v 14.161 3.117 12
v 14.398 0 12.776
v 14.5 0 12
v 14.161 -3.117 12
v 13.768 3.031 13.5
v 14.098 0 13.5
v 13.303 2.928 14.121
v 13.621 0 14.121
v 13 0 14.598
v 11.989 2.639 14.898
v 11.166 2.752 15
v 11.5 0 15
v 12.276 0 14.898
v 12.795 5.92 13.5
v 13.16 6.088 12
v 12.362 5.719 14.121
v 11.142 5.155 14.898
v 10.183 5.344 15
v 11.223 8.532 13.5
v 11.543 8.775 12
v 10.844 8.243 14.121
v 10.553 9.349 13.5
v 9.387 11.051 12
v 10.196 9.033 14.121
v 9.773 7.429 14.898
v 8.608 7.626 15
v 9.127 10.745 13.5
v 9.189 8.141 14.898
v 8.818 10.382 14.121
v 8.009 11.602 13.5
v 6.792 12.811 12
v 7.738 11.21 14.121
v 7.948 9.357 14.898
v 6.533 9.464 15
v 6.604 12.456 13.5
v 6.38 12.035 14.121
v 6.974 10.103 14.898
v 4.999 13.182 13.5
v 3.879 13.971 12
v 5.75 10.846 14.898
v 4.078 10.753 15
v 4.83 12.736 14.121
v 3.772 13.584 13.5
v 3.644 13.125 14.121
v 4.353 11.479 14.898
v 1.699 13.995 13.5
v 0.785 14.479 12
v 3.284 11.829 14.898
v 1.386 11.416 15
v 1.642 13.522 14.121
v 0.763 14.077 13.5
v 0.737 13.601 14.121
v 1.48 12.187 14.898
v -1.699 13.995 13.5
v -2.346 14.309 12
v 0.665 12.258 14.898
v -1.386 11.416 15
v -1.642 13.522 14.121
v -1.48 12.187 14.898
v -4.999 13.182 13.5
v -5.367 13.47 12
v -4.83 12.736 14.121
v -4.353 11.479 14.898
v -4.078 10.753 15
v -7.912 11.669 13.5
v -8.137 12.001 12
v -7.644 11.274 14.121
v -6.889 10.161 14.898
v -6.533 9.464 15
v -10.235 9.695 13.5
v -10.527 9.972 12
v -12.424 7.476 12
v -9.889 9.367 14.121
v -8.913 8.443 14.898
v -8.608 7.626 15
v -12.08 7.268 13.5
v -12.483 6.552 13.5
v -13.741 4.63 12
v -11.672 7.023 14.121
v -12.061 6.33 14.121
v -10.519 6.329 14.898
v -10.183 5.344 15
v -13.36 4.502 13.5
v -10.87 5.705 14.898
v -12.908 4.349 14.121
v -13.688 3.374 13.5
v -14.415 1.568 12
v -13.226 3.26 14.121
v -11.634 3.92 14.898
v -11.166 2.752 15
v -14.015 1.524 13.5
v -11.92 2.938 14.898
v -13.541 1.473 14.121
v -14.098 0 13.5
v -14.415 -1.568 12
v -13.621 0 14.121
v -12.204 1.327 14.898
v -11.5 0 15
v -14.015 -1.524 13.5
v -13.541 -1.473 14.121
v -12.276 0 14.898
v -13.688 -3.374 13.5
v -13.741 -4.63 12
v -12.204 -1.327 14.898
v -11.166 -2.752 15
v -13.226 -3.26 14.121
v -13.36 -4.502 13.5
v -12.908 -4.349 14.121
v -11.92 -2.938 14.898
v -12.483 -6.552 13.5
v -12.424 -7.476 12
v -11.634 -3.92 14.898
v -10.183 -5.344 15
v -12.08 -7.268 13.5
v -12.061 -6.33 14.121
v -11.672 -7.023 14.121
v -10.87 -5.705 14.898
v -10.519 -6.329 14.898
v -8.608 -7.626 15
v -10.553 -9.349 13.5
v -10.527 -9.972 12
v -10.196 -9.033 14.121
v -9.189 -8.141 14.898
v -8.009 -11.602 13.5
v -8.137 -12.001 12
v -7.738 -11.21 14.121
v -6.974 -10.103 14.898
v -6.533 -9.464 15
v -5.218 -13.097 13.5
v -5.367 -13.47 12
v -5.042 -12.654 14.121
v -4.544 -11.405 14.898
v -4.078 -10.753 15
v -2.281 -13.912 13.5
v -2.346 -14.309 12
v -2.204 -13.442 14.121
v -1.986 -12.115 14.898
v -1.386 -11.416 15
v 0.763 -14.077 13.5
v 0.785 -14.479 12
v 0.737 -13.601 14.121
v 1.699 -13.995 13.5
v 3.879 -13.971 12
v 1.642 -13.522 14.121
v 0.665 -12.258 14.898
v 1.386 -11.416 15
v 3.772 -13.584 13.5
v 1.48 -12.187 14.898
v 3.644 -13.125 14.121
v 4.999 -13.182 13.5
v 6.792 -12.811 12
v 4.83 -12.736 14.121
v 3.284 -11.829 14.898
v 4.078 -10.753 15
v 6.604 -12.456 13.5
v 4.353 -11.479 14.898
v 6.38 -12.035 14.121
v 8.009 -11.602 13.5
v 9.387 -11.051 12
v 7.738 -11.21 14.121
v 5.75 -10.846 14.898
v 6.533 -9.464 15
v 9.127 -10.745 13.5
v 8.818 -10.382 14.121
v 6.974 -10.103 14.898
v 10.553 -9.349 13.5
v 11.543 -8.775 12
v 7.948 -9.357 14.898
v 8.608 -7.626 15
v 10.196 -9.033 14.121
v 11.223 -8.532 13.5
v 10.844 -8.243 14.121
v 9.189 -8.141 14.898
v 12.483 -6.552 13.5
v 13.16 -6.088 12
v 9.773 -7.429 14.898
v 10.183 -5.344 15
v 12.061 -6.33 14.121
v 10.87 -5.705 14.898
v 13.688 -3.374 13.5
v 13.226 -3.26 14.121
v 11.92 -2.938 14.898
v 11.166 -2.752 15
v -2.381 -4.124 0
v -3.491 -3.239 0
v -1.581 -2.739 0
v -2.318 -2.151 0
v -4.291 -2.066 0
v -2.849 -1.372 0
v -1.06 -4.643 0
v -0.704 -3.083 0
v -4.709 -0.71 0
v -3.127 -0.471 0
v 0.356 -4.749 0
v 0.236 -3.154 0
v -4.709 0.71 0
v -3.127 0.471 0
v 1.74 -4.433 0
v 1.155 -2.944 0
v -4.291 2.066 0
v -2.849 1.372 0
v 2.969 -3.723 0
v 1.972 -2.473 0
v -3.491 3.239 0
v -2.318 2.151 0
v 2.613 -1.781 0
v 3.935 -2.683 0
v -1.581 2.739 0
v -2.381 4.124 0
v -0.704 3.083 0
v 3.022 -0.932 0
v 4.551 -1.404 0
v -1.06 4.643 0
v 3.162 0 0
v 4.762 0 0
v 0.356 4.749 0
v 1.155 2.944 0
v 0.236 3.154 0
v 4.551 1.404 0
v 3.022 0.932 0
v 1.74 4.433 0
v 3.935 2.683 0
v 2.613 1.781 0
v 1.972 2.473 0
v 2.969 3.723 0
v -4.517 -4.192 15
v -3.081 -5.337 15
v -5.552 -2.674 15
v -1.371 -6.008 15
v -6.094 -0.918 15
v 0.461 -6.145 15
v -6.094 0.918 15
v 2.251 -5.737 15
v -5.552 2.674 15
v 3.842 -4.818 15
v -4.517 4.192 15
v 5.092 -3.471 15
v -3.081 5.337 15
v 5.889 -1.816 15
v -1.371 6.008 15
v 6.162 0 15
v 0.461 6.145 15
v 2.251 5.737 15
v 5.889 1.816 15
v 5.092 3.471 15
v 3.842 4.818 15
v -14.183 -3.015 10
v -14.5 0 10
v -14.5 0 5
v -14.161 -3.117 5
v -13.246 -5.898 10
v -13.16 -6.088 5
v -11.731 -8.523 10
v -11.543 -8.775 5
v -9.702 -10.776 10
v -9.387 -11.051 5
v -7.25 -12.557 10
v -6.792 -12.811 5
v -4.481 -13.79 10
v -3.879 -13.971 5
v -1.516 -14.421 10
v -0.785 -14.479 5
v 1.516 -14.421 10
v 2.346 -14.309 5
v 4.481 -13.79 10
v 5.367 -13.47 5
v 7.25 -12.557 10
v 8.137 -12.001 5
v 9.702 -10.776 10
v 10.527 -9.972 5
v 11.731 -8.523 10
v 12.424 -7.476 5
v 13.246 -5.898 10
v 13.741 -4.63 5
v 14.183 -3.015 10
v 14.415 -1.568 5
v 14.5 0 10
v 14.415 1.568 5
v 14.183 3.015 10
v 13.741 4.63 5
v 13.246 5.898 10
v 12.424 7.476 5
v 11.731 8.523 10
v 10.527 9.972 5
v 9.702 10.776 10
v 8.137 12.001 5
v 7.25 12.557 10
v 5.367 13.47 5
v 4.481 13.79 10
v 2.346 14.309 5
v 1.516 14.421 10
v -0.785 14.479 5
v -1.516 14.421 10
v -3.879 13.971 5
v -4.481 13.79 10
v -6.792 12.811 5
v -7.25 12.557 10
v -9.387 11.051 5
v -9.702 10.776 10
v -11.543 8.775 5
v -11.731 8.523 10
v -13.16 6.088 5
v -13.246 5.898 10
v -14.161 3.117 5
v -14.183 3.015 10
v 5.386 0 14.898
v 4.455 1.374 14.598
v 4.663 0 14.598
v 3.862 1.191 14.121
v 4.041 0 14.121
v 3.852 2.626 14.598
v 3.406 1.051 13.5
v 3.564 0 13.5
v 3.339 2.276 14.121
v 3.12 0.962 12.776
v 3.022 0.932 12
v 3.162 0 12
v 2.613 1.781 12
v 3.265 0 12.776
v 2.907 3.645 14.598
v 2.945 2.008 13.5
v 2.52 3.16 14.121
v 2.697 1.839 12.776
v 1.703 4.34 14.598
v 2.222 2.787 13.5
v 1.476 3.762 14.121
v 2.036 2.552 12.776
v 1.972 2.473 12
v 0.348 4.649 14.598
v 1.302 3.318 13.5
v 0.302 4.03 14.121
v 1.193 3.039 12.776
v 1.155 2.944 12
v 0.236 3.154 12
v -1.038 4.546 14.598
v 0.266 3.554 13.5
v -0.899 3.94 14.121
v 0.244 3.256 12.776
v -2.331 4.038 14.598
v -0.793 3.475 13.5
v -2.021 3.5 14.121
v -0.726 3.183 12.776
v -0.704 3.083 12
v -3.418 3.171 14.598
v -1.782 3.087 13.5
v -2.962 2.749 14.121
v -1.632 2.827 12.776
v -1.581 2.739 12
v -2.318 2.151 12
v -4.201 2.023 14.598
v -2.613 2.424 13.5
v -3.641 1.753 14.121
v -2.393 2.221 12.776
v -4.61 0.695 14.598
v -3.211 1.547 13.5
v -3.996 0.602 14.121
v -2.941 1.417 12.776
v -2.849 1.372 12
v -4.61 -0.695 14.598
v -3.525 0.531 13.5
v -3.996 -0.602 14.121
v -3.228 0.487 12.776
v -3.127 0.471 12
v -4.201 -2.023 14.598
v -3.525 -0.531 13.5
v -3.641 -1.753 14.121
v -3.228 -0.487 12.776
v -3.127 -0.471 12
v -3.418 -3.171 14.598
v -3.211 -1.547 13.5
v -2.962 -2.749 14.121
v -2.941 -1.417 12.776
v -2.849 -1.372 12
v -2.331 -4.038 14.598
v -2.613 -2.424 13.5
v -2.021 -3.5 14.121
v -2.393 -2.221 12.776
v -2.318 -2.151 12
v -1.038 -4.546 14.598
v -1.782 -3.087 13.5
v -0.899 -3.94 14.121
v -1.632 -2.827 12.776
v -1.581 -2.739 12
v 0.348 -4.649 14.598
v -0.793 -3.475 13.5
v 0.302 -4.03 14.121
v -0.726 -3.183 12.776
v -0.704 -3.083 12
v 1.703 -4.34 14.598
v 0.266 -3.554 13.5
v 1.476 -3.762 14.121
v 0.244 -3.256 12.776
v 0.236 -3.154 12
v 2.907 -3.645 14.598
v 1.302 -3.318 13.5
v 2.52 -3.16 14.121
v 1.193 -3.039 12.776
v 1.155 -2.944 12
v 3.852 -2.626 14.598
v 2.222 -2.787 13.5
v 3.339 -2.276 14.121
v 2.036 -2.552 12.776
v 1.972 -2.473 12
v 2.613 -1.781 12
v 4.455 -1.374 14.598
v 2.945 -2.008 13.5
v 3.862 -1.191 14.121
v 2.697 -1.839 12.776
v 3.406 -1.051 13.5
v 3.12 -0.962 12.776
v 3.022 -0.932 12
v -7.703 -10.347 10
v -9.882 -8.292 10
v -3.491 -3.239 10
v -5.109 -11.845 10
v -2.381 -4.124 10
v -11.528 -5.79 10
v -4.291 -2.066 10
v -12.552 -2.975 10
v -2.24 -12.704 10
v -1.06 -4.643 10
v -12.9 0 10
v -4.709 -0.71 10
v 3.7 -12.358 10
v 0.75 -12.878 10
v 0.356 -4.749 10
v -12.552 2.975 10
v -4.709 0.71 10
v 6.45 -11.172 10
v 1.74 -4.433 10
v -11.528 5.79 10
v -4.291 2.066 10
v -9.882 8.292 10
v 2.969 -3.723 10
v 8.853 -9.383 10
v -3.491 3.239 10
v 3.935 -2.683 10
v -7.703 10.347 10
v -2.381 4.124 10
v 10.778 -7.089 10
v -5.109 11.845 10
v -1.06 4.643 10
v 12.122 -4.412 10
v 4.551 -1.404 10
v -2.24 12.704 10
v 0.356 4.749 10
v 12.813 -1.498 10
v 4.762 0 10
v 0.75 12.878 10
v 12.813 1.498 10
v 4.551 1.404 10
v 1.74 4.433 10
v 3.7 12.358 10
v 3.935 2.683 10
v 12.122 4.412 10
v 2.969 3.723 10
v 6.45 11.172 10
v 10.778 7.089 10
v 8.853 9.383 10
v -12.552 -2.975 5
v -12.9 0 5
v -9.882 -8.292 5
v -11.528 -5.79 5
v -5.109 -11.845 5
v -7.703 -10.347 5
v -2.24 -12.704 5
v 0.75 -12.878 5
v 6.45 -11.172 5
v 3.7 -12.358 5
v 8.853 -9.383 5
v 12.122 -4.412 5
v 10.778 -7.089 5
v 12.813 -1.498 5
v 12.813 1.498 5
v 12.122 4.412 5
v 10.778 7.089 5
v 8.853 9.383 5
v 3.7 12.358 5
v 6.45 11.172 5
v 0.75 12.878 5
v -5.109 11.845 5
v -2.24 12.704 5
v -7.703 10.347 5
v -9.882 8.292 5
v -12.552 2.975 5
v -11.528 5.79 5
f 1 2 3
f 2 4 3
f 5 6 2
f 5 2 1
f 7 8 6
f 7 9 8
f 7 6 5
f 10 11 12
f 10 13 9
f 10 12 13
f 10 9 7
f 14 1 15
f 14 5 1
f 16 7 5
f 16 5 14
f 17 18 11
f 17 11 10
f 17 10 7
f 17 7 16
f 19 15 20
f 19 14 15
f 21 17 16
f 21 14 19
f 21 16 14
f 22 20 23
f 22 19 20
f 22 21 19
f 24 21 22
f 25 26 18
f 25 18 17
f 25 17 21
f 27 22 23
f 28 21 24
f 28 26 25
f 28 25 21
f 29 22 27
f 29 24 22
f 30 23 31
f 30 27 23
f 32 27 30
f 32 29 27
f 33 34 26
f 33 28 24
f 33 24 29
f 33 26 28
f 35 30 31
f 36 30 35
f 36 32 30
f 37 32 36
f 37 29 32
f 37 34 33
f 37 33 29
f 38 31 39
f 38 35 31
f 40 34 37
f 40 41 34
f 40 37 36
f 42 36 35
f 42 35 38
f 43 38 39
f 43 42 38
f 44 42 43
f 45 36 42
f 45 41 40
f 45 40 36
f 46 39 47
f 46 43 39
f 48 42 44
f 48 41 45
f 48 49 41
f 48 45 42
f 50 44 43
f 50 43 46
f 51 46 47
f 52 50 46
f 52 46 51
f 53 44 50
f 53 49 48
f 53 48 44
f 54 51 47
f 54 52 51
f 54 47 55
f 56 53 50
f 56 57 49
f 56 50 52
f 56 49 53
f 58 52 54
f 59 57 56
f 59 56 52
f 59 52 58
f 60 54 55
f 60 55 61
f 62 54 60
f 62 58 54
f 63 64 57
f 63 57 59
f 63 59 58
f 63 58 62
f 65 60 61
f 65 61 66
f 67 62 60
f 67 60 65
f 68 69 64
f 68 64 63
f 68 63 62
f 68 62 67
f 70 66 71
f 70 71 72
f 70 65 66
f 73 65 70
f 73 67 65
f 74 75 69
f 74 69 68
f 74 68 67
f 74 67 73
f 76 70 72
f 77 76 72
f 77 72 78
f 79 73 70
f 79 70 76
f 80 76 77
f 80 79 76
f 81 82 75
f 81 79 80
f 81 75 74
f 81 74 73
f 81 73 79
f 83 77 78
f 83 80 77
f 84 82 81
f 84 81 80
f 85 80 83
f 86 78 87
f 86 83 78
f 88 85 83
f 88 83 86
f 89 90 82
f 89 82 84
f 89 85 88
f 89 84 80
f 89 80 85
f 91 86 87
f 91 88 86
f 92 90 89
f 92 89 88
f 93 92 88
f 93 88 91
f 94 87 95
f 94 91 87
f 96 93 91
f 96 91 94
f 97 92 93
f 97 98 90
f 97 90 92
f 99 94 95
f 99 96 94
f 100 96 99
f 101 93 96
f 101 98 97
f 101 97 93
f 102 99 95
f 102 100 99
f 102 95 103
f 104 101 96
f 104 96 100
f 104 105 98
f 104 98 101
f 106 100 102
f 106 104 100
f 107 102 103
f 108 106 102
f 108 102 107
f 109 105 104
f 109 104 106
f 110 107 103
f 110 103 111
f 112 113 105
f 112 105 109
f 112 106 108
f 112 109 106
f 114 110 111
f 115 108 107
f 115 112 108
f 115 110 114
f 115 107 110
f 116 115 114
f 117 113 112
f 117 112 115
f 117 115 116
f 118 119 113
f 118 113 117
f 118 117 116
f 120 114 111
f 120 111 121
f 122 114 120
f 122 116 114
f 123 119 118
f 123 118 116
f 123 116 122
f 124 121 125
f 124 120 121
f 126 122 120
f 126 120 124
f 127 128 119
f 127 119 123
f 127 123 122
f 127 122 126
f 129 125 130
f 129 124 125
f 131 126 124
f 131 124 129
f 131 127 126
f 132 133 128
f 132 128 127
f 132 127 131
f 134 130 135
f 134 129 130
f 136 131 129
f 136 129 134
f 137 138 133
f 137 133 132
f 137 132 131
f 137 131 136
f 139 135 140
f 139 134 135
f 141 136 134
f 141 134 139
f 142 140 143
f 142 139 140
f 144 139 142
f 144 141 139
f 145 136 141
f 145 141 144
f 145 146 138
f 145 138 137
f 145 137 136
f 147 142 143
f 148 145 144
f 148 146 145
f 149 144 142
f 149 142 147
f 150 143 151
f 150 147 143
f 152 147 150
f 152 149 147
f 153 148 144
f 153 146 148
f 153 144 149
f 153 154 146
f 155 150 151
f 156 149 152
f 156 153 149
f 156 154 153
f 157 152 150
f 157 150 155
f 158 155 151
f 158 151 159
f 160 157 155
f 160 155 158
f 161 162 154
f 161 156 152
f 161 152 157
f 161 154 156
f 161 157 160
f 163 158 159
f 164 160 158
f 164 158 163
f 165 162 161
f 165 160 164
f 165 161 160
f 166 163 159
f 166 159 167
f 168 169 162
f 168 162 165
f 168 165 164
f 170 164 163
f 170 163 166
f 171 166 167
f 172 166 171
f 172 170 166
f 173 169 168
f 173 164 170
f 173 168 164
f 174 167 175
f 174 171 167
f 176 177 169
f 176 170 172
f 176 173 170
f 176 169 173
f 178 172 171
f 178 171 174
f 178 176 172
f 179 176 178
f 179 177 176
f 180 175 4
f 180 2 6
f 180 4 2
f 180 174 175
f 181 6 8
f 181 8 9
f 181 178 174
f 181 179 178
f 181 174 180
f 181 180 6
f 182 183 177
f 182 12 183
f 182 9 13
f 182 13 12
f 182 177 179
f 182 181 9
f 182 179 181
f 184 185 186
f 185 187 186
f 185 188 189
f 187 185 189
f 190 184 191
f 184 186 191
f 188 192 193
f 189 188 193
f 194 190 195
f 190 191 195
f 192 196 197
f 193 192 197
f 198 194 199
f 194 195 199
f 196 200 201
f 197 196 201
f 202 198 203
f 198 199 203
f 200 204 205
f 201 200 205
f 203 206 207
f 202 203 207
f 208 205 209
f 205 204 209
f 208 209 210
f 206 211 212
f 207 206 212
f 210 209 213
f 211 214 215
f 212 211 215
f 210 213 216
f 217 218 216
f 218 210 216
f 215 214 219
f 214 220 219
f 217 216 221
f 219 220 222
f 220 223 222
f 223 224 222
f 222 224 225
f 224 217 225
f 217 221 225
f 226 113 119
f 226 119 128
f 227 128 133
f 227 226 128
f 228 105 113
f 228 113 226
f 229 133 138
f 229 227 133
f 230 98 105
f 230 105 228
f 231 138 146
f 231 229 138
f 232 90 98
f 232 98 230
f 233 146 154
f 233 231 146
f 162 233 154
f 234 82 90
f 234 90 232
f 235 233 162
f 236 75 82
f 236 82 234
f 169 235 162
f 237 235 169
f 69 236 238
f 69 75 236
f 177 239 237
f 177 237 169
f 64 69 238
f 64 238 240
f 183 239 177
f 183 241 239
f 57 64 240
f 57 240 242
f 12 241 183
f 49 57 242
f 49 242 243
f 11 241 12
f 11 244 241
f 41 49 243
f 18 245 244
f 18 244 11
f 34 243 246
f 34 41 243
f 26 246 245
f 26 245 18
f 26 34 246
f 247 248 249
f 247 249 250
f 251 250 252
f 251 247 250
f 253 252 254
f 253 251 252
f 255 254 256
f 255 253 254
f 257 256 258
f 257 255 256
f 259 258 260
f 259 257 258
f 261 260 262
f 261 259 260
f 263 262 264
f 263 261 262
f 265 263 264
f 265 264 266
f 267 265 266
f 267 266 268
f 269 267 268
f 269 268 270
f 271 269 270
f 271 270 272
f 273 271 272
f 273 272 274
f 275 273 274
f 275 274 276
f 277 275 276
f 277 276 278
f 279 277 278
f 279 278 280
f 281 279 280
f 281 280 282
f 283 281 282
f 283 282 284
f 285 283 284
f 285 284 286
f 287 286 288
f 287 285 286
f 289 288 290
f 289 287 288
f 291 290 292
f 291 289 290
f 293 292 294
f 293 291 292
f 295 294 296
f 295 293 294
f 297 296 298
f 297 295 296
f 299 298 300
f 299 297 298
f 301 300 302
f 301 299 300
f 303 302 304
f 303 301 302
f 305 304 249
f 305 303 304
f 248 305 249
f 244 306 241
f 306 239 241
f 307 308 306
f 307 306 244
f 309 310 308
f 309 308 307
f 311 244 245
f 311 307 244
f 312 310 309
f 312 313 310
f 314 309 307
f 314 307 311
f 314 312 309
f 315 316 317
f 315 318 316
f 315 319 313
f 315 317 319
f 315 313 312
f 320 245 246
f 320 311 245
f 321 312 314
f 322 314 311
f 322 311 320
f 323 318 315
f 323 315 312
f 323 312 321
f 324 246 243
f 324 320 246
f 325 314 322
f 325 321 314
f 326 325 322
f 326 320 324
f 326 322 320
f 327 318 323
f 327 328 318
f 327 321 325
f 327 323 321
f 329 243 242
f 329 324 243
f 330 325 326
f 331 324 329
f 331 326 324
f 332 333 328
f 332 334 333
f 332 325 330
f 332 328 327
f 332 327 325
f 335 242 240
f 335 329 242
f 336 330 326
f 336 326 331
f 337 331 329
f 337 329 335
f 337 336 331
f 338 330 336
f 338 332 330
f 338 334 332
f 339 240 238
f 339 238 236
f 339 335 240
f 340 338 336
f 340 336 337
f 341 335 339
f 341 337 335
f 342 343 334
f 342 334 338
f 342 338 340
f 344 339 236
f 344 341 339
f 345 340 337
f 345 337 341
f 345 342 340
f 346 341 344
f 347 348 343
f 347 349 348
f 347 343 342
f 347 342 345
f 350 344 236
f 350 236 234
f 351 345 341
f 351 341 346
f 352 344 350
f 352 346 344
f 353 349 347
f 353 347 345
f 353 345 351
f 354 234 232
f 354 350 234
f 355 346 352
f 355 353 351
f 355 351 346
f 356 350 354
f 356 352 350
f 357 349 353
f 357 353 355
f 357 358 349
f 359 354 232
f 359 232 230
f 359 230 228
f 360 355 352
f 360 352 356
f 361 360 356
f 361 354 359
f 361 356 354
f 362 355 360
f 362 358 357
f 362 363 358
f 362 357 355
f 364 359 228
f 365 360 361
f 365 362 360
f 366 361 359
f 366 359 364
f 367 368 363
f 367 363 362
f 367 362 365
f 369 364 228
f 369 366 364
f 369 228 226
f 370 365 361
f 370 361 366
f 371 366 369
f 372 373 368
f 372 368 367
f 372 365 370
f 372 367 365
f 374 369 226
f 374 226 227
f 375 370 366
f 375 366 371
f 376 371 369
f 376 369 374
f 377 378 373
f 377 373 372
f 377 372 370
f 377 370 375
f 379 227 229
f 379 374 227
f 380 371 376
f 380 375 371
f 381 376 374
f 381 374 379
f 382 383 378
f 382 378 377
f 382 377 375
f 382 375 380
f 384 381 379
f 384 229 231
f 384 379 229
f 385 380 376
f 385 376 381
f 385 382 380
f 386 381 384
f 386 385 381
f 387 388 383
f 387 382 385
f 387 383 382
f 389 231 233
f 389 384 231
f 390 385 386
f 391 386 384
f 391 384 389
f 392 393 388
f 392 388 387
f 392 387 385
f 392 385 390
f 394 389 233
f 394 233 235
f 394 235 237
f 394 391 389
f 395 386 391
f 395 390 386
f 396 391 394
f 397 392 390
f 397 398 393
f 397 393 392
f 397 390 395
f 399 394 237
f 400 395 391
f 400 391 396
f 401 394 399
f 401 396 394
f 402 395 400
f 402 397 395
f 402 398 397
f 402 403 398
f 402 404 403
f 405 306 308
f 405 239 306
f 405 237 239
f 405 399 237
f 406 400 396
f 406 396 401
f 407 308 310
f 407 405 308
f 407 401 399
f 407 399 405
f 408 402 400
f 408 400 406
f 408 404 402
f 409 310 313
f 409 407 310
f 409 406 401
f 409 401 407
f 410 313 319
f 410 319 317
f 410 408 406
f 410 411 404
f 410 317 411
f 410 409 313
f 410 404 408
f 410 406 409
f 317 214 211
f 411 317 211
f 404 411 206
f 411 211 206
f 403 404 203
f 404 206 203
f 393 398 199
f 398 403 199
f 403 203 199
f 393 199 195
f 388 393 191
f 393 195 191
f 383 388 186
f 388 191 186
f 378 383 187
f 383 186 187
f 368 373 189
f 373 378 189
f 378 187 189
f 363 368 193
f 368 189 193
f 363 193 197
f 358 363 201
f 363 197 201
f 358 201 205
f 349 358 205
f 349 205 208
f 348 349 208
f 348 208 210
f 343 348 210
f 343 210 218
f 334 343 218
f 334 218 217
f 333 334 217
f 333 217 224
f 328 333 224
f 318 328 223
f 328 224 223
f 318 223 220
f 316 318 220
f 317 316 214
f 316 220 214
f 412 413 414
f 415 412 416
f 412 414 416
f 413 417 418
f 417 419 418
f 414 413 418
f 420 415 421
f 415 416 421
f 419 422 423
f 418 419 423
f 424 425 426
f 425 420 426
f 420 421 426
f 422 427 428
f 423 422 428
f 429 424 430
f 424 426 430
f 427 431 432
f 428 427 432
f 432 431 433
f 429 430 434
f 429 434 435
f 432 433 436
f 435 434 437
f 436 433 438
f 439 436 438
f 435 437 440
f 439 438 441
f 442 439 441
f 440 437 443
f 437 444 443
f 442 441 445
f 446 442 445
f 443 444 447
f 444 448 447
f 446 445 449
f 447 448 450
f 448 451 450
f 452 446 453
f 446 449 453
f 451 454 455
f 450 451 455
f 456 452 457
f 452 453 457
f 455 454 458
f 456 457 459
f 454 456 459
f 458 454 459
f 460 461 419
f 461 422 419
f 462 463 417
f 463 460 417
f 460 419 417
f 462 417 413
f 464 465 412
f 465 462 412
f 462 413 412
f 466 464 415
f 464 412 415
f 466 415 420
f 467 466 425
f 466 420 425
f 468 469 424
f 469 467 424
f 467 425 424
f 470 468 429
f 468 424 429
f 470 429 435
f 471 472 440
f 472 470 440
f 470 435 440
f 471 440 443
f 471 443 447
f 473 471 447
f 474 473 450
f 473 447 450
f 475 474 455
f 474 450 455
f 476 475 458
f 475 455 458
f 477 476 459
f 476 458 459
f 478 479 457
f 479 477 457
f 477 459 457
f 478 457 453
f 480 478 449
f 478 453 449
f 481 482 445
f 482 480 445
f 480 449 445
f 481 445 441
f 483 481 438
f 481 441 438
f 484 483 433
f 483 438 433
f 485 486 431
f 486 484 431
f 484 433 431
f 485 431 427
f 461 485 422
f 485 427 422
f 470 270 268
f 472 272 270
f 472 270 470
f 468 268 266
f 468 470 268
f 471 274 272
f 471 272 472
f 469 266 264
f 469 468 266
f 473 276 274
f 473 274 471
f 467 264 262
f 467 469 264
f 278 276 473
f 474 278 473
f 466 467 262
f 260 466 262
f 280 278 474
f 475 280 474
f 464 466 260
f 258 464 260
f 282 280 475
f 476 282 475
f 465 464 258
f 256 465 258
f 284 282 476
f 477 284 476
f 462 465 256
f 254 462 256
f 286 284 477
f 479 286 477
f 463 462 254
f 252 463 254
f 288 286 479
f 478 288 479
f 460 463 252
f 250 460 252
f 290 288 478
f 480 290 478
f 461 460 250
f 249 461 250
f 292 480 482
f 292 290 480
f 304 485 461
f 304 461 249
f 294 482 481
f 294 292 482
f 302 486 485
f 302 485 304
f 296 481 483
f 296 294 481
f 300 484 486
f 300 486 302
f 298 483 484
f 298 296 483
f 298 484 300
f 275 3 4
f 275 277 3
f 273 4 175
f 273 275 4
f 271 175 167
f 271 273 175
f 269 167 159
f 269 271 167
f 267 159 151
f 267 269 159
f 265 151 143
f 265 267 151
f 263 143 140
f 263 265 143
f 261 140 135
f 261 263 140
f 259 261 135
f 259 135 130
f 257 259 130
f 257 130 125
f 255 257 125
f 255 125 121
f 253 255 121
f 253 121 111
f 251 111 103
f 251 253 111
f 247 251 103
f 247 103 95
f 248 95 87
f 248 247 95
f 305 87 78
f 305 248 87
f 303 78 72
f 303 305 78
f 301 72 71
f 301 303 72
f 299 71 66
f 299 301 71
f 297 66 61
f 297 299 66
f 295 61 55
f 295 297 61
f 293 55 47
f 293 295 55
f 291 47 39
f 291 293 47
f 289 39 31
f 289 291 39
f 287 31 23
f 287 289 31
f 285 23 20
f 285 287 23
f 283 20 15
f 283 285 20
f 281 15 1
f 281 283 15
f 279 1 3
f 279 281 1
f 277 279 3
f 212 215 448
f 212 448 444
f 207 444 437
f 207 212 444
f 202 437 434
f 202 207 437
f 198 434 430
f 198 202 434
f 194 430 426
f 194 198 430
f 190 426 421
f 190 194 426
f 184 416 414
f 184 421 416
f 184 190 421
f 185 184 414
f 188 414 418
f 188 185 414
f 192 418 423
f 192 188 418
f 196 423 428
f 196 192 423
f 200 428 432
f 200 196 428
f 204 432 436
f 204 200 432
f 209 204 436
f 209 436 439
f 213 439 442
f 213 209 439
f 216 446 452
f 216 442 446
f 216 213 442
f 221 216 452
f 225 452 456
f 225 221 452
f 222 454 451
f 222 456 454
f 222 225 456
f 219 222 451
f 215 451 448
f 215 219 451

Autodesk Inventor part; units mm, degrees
ref_plane "YZ Plane" through (0, 0, 0) normal (1, 0, 0) x (0, 1, 0)
ref_plane "XZ Plane" through (0, 0, 0) normal (0, 1, 0) x (-1, 0, 0)
ref_plane "XY Plane" through (0, 0, 0) normal (0, 0, 1) x (1, 0, 0)
sketch "Sketch1" plane through (0, 0, 0) normal (0, 0, 1) x (1, 0, 0)
  circle A0 centre (0, 0) radius 4.7625
  circle A1 centre (0, 0) radius 3.1625
  dimension "d0" = 9.525
  dimension "d4" = 1.6
extrude "Extrusion1" add sketch "Sketch1" along normal blind 10
sketch "Sketch2" plane through (0, 0, 10) normal (0, 0, 1) x (1, 0, 0)
  circle A0 centre (0, 0) radius 14.5
  circle A1 centre (0, 0) radius 4.7625 projected
  circle A2 centre (0, 0) radius 3.1625 projected
  circle A3 centre (0, 0) radius 4.7625 projected
  dimension "d5" = 29
extrude "Extrusion2" add sketch "Sketch2" along normal blind 5 contours A0 | A1
sketch "Sketch3" plane through (0, 0, 10) normal (0, 0, -1) x (-1, 0, 0)
  circle A0 centre (0, 0) radius 14.5 projected
  circle A1 centre (0, 0) radius 12.9
  dimension "d8" = 1.6
extrude "Extrusion3" add sketch "Sketch3" along normal blind 5
fillet "Fillet1" radius 3 2 edges at (-3.1625, 0, 15) (-14.5, 0, 15)
properties part number "TA12" material "ABS Plastic"
